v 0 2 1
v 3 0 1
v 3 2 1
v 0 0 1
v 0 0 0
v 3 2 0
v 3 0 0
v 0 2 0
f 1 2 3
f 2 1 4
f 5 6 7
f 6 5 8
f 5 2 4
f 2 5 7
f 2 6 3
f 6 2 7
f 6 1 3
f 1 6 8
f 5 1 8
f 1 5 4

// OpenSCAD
// Unit of length: Unit.INCH
cube(size = [3.0, 2.0, 1.0], center = false);
